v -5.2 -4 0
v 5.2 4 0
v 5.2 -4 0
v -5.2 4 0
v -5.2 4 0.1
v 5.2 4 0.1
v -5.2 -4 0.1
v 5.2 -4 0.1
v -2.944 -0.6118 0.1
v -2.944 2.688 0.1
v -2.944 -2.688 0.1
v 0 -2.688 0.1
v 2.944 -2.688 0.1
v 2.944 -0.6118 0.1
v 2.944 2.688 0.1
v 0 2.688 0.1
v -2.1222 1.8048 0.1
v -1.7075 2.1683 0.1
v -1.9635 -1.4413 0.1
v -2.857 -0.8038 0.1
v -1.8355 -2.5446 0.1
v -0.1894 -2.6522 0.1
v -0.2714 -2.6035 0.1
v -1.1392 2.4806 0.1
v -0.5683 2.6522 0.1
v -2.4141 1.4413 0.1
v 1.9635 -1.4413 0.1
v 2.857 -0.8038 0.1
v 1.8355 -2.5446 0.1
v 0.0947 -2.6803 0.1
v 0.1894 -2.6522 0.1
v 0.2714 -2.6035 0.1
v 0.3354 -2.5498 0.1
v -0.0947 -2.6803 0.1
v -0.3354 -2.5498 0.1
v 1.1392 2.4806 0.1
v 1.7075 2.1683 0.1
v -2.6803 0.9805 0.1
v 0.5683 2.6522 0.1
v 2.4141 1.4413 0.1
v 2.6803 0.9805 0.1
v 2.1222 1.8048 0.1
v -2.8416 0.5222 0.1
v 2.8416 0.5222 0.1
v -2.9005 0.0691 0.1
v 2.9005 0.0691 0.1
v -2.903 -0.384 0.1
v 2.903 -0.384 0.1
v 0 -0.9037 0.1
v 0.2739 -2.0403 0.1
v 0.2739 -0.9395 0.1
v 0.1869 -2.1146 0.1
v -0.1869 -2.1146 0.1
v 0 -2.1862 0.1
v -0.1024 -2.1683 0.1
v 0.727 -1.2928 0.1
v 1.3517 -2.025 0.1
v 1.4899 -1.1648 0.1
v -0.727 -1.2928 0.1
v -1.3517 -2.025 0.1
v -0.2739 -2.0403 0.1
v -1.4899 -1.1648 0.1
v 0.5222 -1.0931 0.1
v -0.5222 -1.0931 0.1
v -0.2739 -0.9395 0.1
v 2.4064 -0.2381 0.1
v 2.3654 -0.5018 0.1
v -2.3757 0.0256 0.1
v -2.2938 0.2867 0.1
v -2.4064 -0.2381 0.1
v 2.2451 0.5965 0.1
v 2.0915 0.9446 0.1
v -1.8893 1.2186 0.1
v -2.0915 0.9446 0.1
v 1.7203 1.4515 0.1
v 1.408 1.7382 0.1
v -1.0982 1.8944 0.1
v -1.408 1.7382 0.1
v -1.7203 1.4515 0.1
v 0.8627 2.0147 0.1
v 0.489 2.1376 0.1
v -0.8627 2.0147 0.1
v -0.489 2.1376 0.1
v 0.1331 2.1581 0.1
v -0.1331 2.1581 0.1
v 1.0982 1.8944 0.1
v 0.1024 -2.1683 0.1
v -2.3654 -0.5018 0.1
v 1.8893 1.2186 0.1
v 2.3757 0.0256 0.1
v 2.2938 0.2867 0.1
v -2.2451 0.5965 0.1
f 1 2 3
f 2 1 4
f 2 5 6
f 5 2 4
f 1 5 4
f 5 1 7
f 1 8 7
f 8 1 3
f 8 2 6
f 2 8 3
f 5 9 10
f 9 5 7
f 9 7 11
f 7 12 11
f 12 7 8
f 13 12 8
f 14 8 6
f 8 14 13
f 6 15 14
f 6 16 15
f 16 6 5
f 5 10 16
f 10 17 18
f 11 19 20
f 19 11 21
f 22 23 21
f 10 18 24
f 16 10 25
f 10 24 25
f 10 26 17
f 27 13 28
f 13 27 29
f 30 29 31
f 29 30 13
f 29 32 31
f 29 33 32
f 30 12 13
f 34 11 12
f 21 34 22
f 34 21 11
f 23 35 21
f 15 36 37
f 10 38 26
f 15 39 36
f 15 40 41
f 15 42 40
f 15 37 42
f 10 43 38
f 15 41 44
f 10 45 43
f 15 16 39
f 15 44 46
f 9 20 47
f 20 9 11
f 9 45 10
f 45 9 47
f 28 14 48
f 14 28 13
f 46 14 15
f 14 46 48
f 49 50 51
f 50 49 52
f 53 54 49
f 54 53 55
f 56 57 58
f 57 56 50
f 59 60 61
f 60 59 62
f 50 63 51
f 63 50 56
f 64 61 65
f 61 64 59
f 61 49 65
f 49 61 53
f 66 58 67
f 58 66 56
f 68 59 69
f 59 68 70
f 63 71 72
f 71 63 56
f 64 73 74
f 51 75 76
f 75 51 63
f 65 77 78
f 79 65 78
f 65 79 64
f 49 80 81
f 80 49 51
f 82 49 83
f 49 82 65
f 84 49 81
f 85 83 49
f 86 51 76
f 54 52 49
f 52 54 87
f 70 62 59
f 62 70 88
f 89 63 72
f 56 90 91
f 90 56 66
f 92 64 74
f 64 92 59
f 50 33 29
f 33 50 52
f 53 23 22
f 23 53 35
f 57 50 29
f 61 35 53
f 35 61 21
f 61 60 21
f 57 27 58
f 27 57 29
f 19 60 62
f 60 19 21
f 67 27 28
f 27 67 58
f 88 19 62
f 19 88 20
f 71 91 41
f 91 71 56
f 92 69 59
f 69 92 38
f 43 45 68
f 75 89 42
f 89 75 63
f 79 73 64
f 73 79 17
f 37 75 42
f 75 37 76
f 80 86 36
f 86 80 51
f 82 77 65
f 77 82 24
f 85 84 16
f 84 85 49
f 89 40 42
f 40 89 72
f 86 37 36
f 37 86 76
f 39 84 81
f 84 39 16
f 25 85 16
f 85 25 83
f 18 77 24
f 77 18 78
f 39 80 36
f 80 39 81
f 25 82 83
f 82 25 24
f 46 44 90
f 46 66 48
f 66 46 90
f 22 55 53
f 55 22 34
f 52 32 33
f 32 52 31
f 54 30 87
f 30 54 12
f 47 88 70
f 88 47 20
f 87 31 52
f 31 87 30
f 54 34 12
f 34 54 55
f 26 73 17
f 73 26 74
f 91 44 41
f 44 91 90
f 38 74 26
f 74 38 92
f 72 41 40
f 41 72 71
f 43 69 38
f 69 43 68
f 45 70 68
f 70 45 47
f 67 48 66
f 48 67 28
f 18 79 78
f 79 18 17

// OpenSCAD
// file: ../p/logo-shell-1971-outerbox.scad
use <../lib.scad>
function ldraw_lib__logo_shell_1971_outerbox() = [
// 0 Logo Shell 1971 Outerbox
// 0 Name: logo-shell-1971-outerbox.dat
// 0 Author: Vincent Messenet [Cheenzo]
// 0 !LDRAW_ORG Primitive UPDATE 2023-04
// 0 !LICENSE Licensed under CC BY 4.0 : see CAreadme.txt
// 
// 0 BFC CERTIFY CCW
  [0,"BFC","CERTIFY"],
  [0,"BFC","CCW"],
// 
// 0 !HISTORY 2023-06-28 [Cheenzo] Created based on 3004s60 by J. C. Tchang [tchang]
// 0 !HISTORY 2023-08-25 [OrionP] Official Update 2023-04
// 
// 
// 0 // Shell Logo 1971
// 0 // Size: x = -11.5 to 11.5 y = -10.5 to 10.5 z = 0
// 
// 3 16 -11.5 0 10.5 -8.29 0 7.05 -6.67 0 8.47
  [3,16,-11.5,0,10.5,-8.29,0,7.05,-6.67,0,8.47],
// 4 16 -7.17 0 -9.94 -7.67 0 -5.63 -11.16 0 -3.14 -11.5 0 -10.5
  [4,16,-7.17,0,-9.94,-7.67,0,-5.63,-11.16,0,-3.14,-11.5,0,-10.5],
// 3 16 -.74 0 -10.36 -1.06 0 -10.17 -7.17 0 -9.94
  [3,16,-.74,0,-10.36,-1.06,0,-10.17,-7.17,0,-9.94],
// 3 16 -11.5 0 10.5 -6.67 0 8.47 -4.45 0 9.69
  [3,16,-11.5,0,10.5,-6.67,0,8.47,-4.45,0,9.69],
// 3 16 0 0 10.5 -11.5 0 10.5 -2.22 0 10.36
  [3,16,0,0,10.5,-11.5,0,10.5,-2.22,0,10.36],
// 3 16 -11.5 0 10.5 -4.45 0 9.69 -2.22 0 10.36
  [3,16,-11.5,0,10.5,-4.45,0,9.69,-2.22,0,10.36],
// 3 16 -11.5 0 10.5 -9.43 0 5.63 -8.29 0 7.05
  [3,16,-11.5,0,10.5,-9.43,0,5.63,-8.29,0,7.05],
// 4 16 11.16 0 -3.14 7.67 0 -5.63 7.17 0 -9.94 11.5 0 -10.5
  [4,16,11.16,0,-3.14,7.67,0,-5.63,7.17,0,-9.94,11.5,0,-10.5],
// 4 16 11.5 0 -10.5 7.17 0 -9.94 .74 0 -10.36 .37 0 -10.47
  [4,16,11.5,0,-10.5,7.17,0,-9.94,.74,0,-10.36,.37,0,-10.47],
// 3 16 7.17 0 -9.94 1.06 0 -10.17 .74 0 -10.36
  [3,16,7.17,0,-9.94,1.06,0,-10.17,.74,0,-10.36],
// 3 16 7.17 0 -9.94 1.31 0 -9.96 1.06 0 -10.17
  [3,16,7.17,0,-9.94,1.31,0,-9.96,1.06,0,-10.17],
// 3 16 .37 0 -10.47 0 0 -10.5 11.5 0 -10.5
  [3,16,.37,0,-10.47,0,0,-10.5,11.5,0,-10.5],
// 3 16 -.37 0 -10.47 -11.5 0 -10.5 0 0 -10.5
  [3,16,-.37,0,-10.47,-11.5,0,-10.5,0,0,-10.5],
// 4 16 -.37 0 -10.47 -.74 0 -10.36 -7.17 0 -9.94 -11.5 0 -10.5
  [4,16,-.37,0,-10.47,-.74,0,-10.36,-7.17,0,-9.94,-11.5,0,-10.5],
// 3 16 -1.06 0 -10.17 -1.31 0 -9.96 -7.17 0 -9.94
  [3,16,-1.06,0,-10.17,-1.31,0,-9.96,-7.17,0,-9.94],
// 3 16 11.5 0 10.5 4.45 0 9.69 6.67 0 8.47
  [3,16,11.5,0,10.5,4.45,0,9.69,6.67,0,8.47],
// 3 16 -11.5 0 10.5 -10.47 0 3.83 -9.43 0 5.63
  [3,16,-11.5,0,10.5,-10.47,0,3.83,-9.43,0,5.63],
// 3 16 11.5 0 10.5 2.22 0 10.36 4.45 0 9.69
  [3,16,11.5,0,10.5,2.22,0,10.36,4.45,0,9.69],
// 3 16 11.5 0 10.5 9.43 0 5.63 10.47 0 3.83
  [3,16,11.5,0,10.5,9.43,0,5.63,10.47,0,3.83],
// 3 16 11.5 0 10.5 8.29 0 7.05 9.43 0 5.63
  [3,16,11.5,0,10.5,8.29,0,7.05,9.43,0,5.63],
// 3 16 11.5 0 10.5 6.67 0 8.47 8.29 0 7.05
  [3,16,11.5,0,10.5,6.67,0,8.47,8.29,0,7.05],
// 3 16 -11.5 0 10.5 -11.1 0 2.04 -10.47 0 3.83
  [3,16,-11.5,0,10.5,-11.1,0,2.04,-10.47,0,3.83],
// 3 16 11.5 0 10.5 10.47 0 3.83 11.1 0 2.04
  [3,16,11.5,0,10.5,10.47,0,3.83,11.1,0,2.04],
// 3 16 -11.5 0 10.5 -11.33 0 .27 -11.1 0 2.04
  [3,16,-11.5,0,10.5,-11.33,0,.27,-11.1,0,2.04],
// 3 16 11.5 0 10.5 0 0 10.5 2.22 0 10.36
  [3,16,11.5,0,10.5,0,0,10.5,2.22,0,10.36],
// 3 16 11.5 0 10.5 11.1 0 2.04 11.33 0 .27
  [3,16,11.5,0,10.5,11.1,0,2.04,11.33,0,.27],
// 4 16 -11.16 0 -3.14 -11.34 0 -1.5 -11.5 0 -2.39 -11.5 0 -10.5
  [4,16,-11.16,0,-3.14,-11.34,0,-1.5,-11.5,0,-2.39,-11.5,0,-10.5],
// 4 16 -11.34 0 -1.5 -11.33 0 .27 -11.5 0 10.5 -11.5 0 -2.39
  [4,16,-11.34,0,-1.5,-11.33,0,.27,-11.5,0,10.5,-11.5,0,-2.39],
// 4 16 11.5 0 -2.39 11.34 0 -1.5 11.16 0 -3.14 11.5 0 -10.5
  [4,16,11.5,0,-2.39,11.34,0,-1.5,11.16,0,-3.14,11.5,0,-10.5],
// 4 16 11.5 0 -2.39 11.5 0 10.5 11.33 0 .27 11.34 0 -1.5
  [4,16,11.5,0,-2.39,11.5,0,10.5,11.33,0,.27,11.34,0,-1.5],
];
module ldraw_lib__logo_shell_1971_outerbox(step=0, col=false, unit=2/5, alt=false, line=0.2, solid=!$preview)
    makepoly(ldraw_lib__logo_shell_1971_outerbox(), step=step, col=col, unit=unit, alt=alt, line=line, solid=solid);
ldraw_lib__logo_shell_1971_outerbox(line=0.2);
// file: ../p/box5-12.scad
use <../lib.scad>
function ldraw_lib__box5_12() = [
// 0 Box with 5 Faces without Any Edges
// 0 Name: box5-12.dat
// 0 Author: Chris Dee [cwdee]
// 0 !LDRAW_ORG Primitive UPDATE 2009-02
// 0 !LICENSE Licensed under CC BY 4.0 : see CAreadme.txt
// 
// 0 BFC CERTIFY CCW
  [0,"BFC","CERTIFY"],
  [0,"BFC","CCW"],
// 
// 0 !HISTORY 2009-09-03 [PTadmin] Official Update 2009-02
// 
// 
// 4 16 1 1 1 1 1 -1 -1 1 -1 -1 1 1
  [4,16,1,1,1,1,1,-1,-1,1,-1,-1,1,1],
// 4 16 -1 0 1 1 0 1 1 1 1 -1 1 1
  [4,16,-1,0,1,1,0,1,1,1,1,-1,1,1],
// 4 16 -1 0 -1 -1 0 1 -1 1 1 -1 1 -1
  [4,16,-1,0,-1,-1,0,1,-1,1,1,-1,1,-1],
// 4 16 1 0 -1 -1 0 -1 -1 1 -1 1 1 -1
  [4,16,1,0,-1,-1,0,-1,-1,1,-1,1,1,-1],
// 4 16 1 0 1 1 0 -1 1 1 -1 1 1 1
  [4,16,1,0,1,1,0,-1,1,1,-1,1,1,1],
// 0
];
module ldraw_lib__box5_12(step=0, col=false, unit=2/5, alt=false, line=0.2, solid=!$preview)
    makepoly(ldraw_lib__box5_12(), step=step, col=col, unit=unit, alt=alt, line=line, solid=solid);
ldraw_lib__box5_12(line=0.2);
// main file
use <../lib.scad>
use <../p/box5-12.scad>
use <../p/logo-shell-1971-outerbox.scad>
use <../p/logo-shell-1971.scad>
function ldraw_lib__195555b() = [
// 0 Sticker  1.0 x  1.3 with Shell Logo 1971 on White Background
// 0 Name: 195555b.dat
// 0 Author: Takeshi Takahashi [RainbowDolphin]
// 0 !LDRAW_ORG Part UPDATE 2026-01
// 0 !LICENSE Licensed under CC BY 4.0 : see CAreadme.txt
// 
// 0 BFC CERTIFY CCW
  [0,"BFC","CERTIFY"],
  [0,"BFC","CCW"],
// 
// 0 !KEYWORDS Bricklink 6371stk01, Brickowl 584391, Rebrickable 195555
// 0 !KEYWORDS Service station, Set 6371
// 
// 0 !HISTORY 2023-06-29 [RainbowDolphin] Colour variant of 196945x by Vincent Messenet [Cheenzo]
// 0 !HISTORY 2023-08-25 [OrionP] Official Update 2023-04
// 0 !HISTORY 2026-01-23 [MagFors] Update description
// 0 !HISTORY 2026-01-29 [OrionP] Official Update 2026-01
// 
// 1 16 0 -.25 0 13 0 0 0 .25 0 0 0 10 box5-12.dat
  [1,16,0,-.25,0,13,0,0,0,.25,0,0,0,10, ldraw_lib__box5_12()],
// 4 15 -7.36 -.25 -1.5296 -7.36 -.25 6.72 -13 -.25 10 -13 -.25 -10
  [4,15,-7.36,-.25,-1.5296,-7.36,-.25,6.72,-13,-.25,10,-13,-.25,-10],
// 3 15 -7.36 -.25 -1.5296 -13 -.25 -10 -7.36 -.25 -6.72
  [3,15,-7.36,-.25,-1.5296,-13,-.25,-10,-7.36,-.25,-6.72],
// 4 15 0 -.25 -6.72 -7.36 -.25 -6.72 -13 -.25 -10 13 -.25 -10
  [4,15,0,-.25,-6.72,-7.36,-.25,-6.72,-13,-.25,-10,13,-.25,-10],
// 3 15 7.36 -.25 -6.72 0 -.25 -6.72 13 -.25 -10
  [3,15,7.36,-.25,-6.72,0,-.25,-6.72,13,-.25,-10],
// 4 15 7.36 -.25 -1.5296 7.36 -.25 -6.72 13 -.25 -10 13 -.25 10
  [4,15,7.36,-.25,-1.5296,7.36,-.25,-6.72,13,-.25,-10,13,-.25,10],
// 3 15 13 -.25 10 7.36 -.25 6.72 7.36 -.25 -1.5296
  [3,15,13,-.25,10,7.36,-.25,6.72,7.36,-.25,-1.5296],
// 4 15 0 -.25 6.72 7.36 -.25 6.72 13 -.25 10 -13 -.25 10
  [4,15,0,-.25,6.72,7.36,-.25,6.72,13,-.25,10,-13,-.25,10],
// 3 15 -13 -.25 10 -7.36 -.25 6.72 0 -.25 6.72
  [3,15,-13,-.25,10,-7.36,-.25,6.72,0,-.25,6.72],
// 1 15 0 -.25 0 .64 0 0 0 1 0 0 0 .64 logo-shell-1971-outerbox.dat
  [1,15,0,-.25,0,.64,0,0,0,1,0,0,0,.64, ldraw_lib__logo_shell_1971_outerbox()],
// 1 16 0 -.25 0 .64 0 0 0 1 0 0 0 .64 logo-shell-1971.dat
  [1,16,0,-.25,0,.64,0,0,0,1,0,0,0,.64, ldraw_lib__logo_shell_1971()],
];
module ldraw_lib__195555b(step=0, col=false, unit=2/5, alt=false, line=0.2, solid=!$preview)
    makepoly(ldraw_lib__195555b(), step=step, col=col, unit=unit, alt=alt, line=line, solid=solid);
ldraw_lib__195555b(line=0.2);
